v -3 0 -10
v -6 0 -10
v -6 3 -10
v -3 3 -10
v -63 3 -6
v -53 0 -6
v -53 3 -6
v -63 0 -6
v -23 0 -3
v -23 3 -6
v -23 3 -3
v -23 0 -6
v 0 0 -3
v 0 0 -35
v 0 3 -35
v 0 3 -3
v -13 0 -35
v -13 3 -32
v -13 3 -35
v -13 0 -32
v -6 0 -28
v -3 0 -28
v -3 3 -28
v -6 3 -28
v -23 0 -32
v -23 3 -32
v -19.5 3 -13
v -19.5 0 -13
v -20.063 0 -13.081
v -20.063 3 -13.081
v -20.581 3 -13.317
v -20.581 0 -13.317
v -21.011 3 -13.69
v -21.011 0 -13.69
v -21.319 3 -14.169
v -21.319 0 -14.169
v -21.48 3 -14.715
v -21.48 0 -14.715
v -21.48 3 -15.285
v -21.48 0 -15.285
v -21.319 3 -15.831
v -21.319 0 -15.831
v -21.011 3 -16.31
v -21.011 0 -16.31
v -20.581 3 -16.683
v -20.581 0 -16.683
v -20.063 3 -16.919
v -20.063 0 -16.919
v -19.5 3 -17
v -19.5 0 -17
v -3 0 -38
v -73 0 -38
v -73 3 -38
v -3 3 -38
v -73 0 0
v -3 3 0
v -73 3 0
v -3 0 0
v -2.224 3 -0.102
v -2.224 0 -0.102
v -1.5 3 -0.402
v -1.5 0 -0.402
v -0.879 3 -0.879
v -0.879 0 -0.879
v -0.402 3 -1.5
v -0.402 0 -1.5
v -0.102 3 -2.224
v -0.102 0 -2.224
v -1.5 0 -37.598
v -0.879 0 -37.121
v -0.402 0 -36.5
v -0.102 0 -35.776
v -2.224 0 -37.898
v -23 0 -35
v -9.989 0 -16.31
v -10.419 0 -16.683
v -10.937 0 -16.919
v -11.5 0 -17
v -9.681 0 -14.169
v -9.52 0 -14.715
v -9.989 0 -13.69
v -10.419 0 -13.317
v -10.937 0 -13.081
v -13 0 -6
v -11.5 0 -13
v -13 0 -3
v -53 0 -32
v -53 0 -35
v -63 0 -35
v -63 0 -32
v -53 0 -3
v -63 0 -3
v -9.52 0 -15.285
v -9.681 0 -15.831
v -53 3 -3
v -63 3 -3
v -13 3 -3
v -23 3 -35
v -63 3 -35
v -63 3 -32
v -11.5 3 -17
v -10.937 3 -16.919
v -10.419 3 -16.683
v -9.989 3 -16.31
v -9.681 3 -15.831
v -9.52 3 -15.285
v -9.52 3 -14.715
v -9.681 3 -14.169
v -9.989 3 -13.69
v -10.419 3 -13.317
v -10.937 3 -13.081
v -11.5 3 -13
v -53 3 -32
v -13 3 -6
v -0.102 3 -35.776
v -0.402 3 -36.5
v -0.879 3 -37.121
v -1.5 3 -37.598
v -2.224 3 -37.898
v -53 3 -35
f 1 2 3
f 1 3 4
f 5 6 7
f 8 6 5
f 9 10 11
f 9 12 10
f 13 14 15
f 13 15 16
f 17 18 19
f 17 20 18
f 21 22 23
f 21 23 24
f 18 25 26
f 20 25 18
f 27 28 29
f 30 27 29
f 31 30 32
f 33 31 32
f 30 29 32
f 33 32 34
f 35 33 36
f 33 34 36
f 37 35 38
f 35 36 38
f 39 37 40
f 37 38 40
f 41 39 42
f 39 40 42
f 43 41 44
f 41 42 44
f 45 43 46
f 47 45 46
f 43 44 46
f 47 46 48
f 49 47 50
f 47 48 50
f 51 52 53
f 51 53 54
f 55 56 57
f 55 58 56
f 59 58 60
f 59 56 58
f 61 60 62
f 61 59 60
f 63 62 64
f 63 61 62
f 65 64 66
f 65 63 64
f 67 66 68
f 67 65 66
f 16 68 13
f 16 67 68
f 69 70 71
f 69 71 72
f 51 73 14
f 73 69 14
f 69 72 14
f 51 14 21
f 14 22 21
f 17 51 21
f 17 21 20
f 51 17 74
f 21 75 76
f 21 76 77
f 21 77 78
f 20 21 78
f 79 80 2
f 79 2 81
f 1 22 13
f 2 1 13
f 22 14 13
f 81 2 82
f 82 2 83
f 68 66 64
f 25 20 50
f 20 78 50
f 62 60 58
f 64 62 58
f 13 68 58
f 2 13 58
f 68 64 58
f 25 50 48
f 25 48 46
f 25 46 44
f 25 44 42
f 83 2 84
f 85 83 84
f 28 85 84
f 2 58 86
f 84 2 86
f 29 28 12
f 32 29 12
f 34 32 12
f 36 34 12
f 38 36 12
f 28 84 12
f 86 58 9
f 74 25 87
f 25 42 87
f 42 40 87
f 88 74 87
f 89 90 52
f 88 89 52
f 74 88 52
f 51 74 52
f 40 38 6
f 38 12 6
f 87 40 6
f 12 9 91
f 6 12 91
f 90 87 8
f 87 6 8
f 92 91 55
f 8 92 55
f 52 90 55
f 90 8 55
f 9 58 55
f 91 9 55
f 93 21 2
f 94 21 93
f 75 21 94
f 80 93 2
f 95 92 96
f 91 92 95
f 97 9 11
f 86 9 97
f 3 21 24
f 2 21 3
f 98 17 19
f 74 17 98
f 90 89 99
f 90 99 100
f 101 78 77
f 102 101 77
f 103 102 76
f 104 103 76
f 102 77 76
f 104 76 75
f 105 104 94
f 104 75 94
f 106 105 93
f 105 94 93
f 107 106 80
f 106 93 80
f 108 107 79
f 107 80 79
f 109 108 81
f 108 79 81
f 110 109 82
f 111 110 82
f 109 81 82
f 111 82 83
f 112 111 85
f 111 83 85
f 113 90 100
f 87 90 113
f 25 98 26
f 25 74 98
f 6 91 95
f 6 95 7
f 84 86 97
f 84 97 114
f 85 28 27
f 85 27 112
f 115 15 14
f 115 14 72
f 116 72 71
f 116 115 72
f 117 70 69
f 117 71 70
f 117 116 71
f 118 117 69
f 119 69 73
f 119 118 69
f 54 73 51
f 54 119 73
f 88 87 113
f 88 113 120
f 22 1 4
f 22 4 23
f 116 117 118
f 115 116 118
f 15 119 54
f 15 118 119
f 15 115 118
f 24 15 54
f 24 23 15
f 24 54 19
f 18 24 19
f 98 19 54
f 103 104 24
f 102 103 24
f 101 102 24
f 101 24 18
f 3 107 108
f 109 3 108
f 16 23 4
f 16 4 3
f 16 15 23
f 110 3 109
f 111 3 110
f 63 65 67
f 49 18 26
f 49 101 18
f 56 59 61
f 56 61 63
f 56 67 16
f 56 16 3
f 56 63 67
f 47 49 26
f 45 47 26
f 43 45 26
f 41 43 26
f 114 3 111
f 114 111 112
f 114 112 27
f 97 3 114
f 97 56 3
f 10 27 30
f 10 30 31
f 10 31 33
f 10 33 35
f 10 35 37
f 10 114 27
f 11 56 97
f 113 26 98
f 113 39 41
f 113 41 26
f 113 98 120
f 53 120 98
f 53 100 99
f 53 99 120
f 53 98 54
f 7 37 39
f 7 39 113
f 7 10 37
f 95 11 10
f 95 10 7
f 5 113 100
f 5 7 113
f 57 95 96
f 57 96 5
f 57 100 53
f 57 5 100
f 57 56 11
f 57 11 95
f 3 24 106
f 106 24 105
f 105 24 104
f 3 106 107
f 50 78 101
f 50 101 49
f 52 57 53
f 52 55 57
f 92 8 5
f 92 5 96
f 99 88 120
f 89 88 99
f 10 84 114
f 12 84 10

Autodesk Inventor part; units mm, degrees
ref_plane "YZ Plane" through (0, 0, 0) normal (1, 0, 0) x (0, 1, 0)
ref_plane "XZ Plane" through (0, 0, 0) normal (0, 1, 0) x (-1, 0, 0)
ref_plane "XY Plane" through (0, 0, 0) normal (0, 0, 1) x (1, 0, 0)
sketch "Sketch1" plane through (0, 0, 0) normal (0, 1, 0) x (-1, 0, 0)
  line L0 (0, 0) -> (73, 0)
  line L1 (73, 0) -> (73, -38)
  line L2 (73, -38) -> (0, -38)
  line L3 (0, -38) -> (0, 0)
  line L4 (13, -35) -> (23, -35)
  line L5 (23, -35) -> (23, -32)
  line L6 (23, -32) -> (13, -32)
  line L7 (13, -32) -> (13, -35)
  line L8 (3, -28) -> (6, -28)
  line L9 (6, -28) -> (6, -10)
  line L10 (6, -10) -> (3, -10)
  line L11 (3, -10) -> (3, -28)
  line L12 (13, -6) -> (23, -6)
  line L13 (23, -6) -> (23, -3)
  line L14 (23, -3) -> (13, -3)
  line L15 (13, -3) -> (13, -6)
  line L16 (63, -3) -> (53, -3)
  line L17 (53, -3) -> (53, -6)
  line L18 (53, -6) -> (63, -6)
  line L19 (63, -6) -> (63, -3)
  line L20 (63, -32) -> (53, -32)
  line L21 (53, -32) -> (53, -35)
  line L22 (53, -35) -> (63, -35)
  line L23 (63, -35) -> (63, -32)
  point P0 (3, -19)
  point P1 (0, -19)
  dimension "d0" = 73
  dimension "d1" = 38
  dimension "d3" = 3
  dimension "d4" = 3
  dimension "d5" = 3
  dimension "d6" = 10
  dimension "d7" = 10
  dimension "d8" = 18
  dimension "d9" = 32
  dimension "d10" = 3
  dimension "d11" = 3
  dimension "d12" = 3
  dimension "d13" = 10
  dimension "d14" = 13
extrude "Extrusion1" add sketch "Sketch1" along normal blind 3
fillet "Fillet1" radius 3 2 edges at (0, 1.5, 0) (0, 1.5, -38)
sketch "Sketch2" plane through (0, 0, 0) normal (0, -1, 0) x (1, 0, 0)
  line L0 (-3, -10) -> (-3, -28) projected
  line L1 (-3, -28) -> (-6, -28) projected
  line L2 (-6, -28) -> (-6, -10) projected
  line L3 (-6, -10) -> (-3, -10) projected
  line L4 (-63, -35) -> (-63, -32) projected
  line L5 (-63, -32) -> (-53, -32) projected
  line L6 (-53, -32) -> (-53, -35) projected
  line L7 (-53, -35) -> (-63, -35) projected
  line L8 (-63, -6) -> (-63, -3) projected
  line L9 (-63, -3) -> (-53, -3) projected
  line L10 (-53, -3) -> (-53, -6) projected
  line L11 (-53, -6) -> (-63, -6) projected
  line L12 (-13, -3) -> (-13, -6) projected
  line L13 (-13, -6) -> (-23, -6) projected
  line L14 (-23, -6) -> (-23, -3) projected
  line L15 (-23, -3) -> (-13, -3) projected
  line L16 (-13, -32) -> (-13, -35) projected
  line L17 (-13, -35) -> (-23, -35) projected
  line L18 (-23, -35) -> (-23, -32) projected
  line L19 (-23, -32) -> (-13, -32) projected
  arc A0 (-3, -38) -> (0, -35) centre (-3, -35) ccw projected
  line L20 (0, -35) -> (0, -3) projected
  arc A1 (0, -3) -> (-3, 0) centre (-3, -3) ccw projected
  line L21 (-3, 0) -> (-73, 0) projected
  line L22 (-73, 0) -> (-73, -38) projected
  line L23 (-73, -38) -> (-3, -38) projected
  line L24 (-9.5, -15) -> (-21.5, -15) construction
  line L25 (-11.5, -17) -> (-19.5, -17)
  line L26 (-19.5, -13) -> (-11.5, -13)
  arc A2 (-11.5, -17) -> (-11.5, -13) centre (-11.5, -15) ccw
  arc A3 (-19.5, -13) -> (-19.5, -17) centre (-19.5, -15) ccw
  line L27 (-73, 0) -> (-73, -38) projected
  point P0 (0, 0)
  point P1 (-73, -19)
  point P2 (-15.5, -15)
  point P3 (-73, -19)
  dimension "d21" = 2
  dimension "d22" = 8
  dimension "d23" = 11.5
  dimension "d26" = 15
extrude "Extrusion2" cut sketch "Sketch2" against normal blind 3 contours L25 A3 L26 A2
sketch "Sketch3" plane through (0, 3, 0) normal (0, 1, 0) x (1, 0, 0)
  arc A0 (-11.5, 13) -> (-11.5, 17) centre (-11.5, 15) ccw projected
  line L0 (-11.5, 13) -> (-19.5, 13) projected
  arc A1 (-19.5, 17) -> (-19.5, 13) centre (-19.5, 15) ccw projected
  line L1 (-19.5, 17) -> (-11.5, 17) projected
  arc A2 (0, 35) -> (-3, 38) centre (-3, 35) ccw projected
  line L2 (-3, 38) -> (-73, 38) projected
  line L3 (-73, 38) -> (-73, 0) projected
  line L4 (-73, 0) -> (-3, 0) projected
  arc A3 (-3, 0) -> (0, 3) centre (-3, 3) ccw projected
  line L5 (0, 3) -> (0, 35) projected
  line L6 (-3, 28) -> (-3, 10) projected
  line L7 (-3, 10) -> (-6, 10) projected
  line L8 (-6, 10) -> (-6, 28) projected
  line L9 (-6, 28) -> (-3, 28) projected
  line L10 (-63, 32) -> (-63, 35) projected
  line L11 (-63, 35) -> (-53, 35) projected
  line L12 (-53, 35) -> (-53, 32) projected
  line L13 (-53, 32) -> (-63, 32) projected
  line L14 (-63, 3) -> (-63, 6) projected
  line L15 (-63, 6) -> (-53, 6) projected
  line L16 (-53, 6) -> (-53, 3) projected
  line L17 (-53, 3) -> (-63, 3) projected
  line L18 (-13, 6) -> (-13, 3) projected
  line L19 (-13, 3) -> (-23, 3) projected
  line L20 (-23, 3) -> (-23, 6) projected
  line L21 (-23, 6) -> (-13, 6) projected
  line L22 (-13, 35) -> (-13, 32) projected
  line L23 (-13, 32) -> (-23, 32) projected
  line L24 (-23, 32) -> (-23, 35) projected
  line L25 (-23, 35) -> (-13, 35) projected
  point P0 (0, 0)
equation "\"d5\" = d4"
equation "\"d10\" = d11"
properties part number "motor mount top" material "Polycarbonate, Clear"
